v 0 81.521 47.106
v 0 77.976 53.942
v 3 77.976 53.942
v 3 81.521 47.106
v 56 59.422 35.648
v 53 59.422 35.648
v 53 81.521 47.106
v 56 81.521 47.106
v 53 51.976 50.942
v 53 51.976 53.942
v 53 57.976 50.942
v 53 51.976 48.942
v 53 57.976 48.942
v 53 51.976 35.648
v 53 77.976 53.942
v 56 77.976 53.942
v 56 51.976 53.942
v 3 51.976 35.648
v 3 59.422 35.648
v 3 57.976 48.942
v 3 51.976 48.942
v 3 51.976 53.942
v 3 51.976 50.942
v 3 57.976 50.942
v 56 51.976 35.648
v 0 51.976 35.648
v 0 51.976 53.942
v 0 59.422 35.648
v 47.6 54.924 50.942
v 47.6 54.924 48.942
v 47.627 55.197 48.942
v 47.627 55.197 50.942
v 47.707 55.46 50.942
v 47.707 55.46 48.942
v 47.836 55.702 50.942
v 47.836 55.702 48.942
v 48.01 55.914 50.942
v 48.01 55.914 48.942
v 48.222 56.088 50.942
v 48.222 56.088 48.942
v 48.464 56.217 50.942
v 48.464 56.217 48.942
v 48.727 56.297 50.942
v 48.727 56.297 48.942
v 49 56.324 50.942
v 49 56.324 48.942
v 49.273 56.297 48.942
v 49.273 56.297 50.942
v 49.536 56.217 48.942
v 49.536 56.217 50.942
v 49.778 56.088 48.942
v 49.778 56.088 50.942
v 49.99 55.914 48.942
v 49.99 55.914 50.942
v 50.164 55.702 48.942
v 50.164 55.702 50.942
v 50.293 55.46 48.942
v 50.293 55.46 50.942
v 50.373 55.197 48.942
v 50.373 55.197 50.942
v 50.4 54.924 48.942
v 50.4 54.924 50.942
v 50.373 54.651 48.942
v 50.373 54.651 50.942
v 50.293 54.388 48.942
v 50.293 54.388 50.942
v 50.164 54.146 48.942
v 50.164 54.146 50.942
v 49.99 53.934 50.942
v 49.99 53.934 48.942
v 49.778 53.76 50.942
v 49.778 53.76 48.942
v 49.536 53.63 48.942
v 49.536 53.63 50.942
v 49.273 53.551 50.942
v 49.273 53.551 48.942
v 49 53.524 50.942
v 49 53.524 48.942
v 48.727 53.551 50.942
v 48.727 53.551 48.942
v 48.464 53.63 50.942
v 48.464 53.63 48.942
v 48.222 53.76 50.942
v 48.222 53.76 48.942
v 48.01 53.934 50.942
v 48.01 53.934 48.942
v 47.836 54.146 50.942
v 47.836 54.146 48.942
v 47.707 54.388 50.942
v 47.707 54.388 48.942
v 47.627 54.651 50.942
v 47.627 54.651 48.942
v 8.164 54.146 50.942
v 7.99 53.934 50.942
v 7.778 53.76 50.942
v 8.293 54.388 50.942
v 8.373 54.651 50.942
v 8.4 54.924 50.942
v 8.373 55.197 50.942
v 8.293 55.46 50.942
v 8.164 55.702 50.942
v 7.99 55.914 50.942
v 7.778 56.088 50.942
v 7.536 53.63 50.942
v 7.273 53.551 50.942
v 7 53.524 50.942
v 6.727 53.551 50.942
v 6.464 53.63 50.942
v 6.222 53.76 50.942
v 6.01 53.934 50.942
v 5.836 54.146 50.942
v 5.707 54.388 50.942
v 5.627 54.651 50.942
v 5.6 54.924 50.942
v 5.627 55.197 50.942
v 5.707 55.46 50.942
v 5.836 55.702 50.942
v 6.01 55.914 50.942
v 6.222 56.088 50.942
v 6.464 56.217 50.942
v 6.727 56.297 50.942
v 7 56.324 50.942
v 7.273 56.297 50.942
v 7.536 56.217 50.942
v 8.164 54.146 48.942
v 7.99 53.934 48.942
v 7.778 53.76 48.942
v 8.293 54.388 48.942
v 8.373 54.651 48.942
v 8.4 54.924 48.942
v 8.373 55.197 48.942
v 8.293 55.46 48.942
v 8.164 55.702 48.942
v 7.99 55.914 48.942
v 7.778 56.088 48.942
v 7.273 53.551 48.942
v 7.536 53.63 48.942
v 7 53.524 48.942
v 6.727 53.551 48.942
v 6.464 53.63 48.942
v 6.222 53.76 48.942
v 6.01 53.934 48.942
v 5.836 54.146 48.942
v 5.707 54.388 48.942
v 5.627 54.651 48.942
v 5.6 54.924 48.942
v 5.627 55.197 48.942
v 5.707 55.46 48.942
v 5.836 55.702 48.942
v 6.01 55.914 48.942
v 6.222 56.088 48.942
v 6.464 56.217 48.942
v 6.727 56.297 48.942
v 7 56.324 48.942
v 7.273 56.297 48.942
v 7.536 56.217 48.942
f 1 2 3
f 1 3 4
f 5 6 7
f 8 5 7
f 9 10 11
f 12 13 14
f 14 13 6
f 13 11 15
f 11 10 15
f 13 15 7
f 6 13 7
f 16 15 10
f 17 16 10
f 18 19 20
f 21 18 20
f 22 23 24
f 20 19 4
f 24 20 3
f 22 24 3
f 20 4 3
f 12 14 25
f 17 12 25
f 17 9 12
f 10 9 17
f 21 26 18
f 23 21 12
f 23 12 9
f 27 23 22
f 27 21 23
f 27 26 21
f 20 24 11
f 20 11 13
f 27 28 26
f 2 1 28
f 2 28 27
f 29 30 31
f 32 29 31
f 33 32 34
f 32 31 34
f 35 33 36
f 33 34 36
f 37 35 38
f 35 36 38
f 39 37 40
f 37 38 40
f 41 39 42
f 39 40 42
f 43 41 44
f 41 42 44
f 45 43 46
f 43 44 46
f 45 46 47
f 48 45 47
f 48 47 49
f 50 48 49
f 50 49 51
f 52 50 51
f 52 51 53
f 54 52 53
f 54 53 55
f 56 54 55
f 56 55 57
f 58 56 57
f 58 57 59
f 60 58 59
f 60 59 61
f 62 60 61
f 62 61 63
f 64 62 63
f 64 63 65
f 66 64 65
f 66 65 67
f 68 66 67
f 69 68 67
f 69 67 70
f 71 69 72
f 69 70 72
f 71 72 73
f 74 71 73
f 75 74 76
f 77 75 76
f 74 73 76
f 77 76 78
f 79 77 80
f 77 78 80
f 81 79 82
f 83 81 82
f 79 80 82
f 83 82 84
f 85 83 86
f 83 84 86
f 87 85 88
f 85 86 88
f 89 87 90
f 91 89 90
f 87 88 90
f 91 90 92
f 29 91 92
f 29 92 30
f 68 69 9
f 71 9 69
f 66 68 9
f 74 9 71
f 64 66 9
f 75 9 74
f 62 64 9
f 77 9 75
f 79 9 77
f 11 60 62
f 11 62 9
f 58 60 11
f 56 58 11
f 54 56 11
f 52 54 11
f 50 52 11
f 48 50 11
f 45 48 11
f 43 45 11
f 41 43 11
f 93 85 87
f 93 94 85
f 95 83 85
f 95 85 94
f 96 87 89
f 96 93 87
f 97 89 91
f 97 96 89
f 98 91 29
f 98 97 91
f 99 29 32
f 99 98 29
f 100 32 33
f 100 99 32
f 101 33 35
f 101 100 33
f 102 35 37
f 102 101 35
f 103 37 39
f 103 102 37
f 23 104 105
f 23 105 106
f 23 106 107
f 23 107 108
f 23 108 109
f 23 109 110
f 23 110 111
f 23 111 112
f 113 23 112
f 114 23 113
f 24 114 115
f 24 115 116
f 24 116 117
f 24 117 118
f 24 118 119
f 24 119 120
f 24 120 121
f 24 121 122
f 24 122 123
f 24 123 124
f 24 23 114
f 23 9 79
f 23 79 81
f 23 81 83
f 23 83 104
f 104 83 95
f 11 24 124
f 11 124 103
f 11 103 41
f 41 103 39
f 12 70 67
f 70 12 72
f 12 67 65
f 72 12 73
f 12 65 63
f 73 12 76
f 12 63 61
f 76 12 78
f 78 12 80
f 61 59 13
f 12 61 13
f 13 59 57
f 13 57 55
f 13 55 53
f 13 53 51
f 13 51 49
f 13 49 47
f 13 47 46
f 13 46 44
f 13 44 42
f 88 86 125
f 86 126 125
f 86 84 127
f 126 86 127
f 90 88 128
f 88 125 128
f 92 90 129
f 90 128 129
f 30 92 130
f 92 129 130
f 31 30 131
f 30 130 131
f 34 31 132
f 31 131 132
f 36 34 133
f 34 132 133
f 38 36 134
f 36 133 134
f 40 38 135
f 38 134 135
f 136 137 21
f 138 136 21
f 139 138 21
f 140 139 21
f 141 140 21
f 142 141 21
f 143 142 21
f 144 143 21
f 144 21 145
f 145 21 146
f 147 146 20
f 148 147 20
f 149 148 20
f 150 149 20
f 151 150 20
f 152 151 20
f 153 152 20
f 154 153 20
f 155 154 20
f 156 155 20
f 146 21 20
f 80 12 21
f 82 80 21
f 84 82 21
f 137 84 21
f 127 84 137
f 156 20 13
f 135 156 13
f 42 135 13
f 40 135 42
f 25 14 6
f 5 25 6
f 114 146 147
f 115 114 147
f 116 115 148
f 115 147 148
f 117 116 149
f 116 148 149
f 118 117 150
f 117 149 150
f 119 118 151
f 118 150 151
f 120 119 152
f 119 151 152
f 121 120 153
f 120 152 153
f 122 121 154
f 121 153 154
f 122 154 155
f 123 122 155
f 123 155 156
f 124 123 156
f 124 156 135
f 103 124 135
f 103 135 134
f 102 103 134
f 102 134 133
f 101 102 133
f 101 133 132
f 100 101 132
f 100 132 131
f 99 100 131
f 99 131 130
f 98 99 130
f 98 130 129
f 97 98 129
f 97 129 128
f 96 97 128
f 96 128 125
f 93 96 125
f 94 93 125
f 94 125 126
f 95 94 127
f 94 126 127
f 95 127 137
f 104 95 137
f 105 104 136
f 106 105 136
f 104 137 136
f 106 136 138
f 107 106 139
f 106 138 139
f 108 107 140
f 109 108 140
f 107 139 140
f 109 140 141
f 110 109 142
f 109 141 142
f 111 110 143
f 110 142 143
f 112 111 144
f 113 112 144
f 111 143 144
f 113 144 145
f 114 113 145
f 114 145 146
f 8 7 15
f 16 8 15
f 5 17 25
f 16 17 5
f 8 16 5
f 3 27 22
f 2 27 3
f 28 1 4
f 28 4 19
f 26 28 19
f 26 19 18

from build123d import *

# Parameters (mm, degrees)
EXTRUDE_1_DEPTH     = 3
EXTRUDE_2_DEPTH     = 3
EXTRUDE_3_REACH     = 113.195
SKETCH_5_W          = 2
SKETCH_5_H          = 6
CUT_EXTRUDE_1_REACH = 101.791
SKETCH_8_R          = 1.4


with BuildPart() as part:
    # 草图2 → 凸台-拉伸1 (new body)
    with BuildSketch(Plane(origin=(0, 0, 0), x_dir=(0, 0, -1), z_dir=(1, 0, 0))):
        Polygon((-47.106132348, 81.520542784), (-35.64838785, 59.42240106), (-35.64838785, 51.976234999), (-53.941911918, 51.976234999), (-53.941911918, 77.976234999), align=None)
    extrude(amount=EXTRUDE_1_DEPTH)


with BuildPart() as body_2:
    # 草图3 → 凸台-拉伸2 (new body)
    with BuildSketch(Plane(origin=(53, 0, 0), x_dir=(0, 0, -1), z_dir=(1, 0, 0))):
        Polygon((-47.106132348, 81.520542784), (-53.941911918, 77.976234999), (-53.941911918, 51.976234999), (-35.64838785, 51.976234999), (-35.64838785, 59.42240106), align=None)
    extrude(amount=EXTRUDE_2_DEPTH)

    # 草图5 → 凸台-拉伸3 (add, up to next)
    with BuildSketch(Plane(origin=(3, 0, 0), x_dir=(0, 0, -1), z_dir=(1, 0, 0)), mode=Mode.PRIVATE) as extrude_3_sk1:
        with Locations((-49.941911918, 54.976234999)):
            Rectangle(SKETCH_5_W, SKETCH_5_H)
    extrude_3_tool1 = extrude(extrude_3_sk1.sketch, amount=EXTRUDE_3_REACH, mode=Mode.PRIVATE) - body_2.part

    add(part.part)  # 凸台-拉伸3 merges part
    add(extrude_3_tool1.solids().sort_by_distance((3, 54.976235, 49.941912))[0])

    # 草图8 → 切除-拉伸1 (cut, up to next)
    with BuildSketch(Plane(origin=(0, 0, 48.941911918), x_dir=(-1, 0, 0), z_dir=(0, 0, -1)), mode=Mode.PRIVATE) as cut_extrude_1_sk1:
        with Locations((-49, 54.923853845)):
            Circle(SKETCH_8_R)
    cut_extrude_1_tool1 = extrude(cut_extrude_1_sk1.sketch, amount=-CUT_EXTRUDE_1_REACH, mode=Mode.PRIVATE) & body_2.part
    # 草图8 → 切除-拉伸1 (cut, up to next)
    with BuildSketch(Plane(origin=(0, 0, 48.941911918), x_dir=(-1, 0, 0), z_dir=(0, 0, -1)), mode=Mode.PRIVATE) as cut_extrude_1_sk2:
        with Locations((-7, 54.923853845)):
            Circle(SKETCH_8_R)
    cut_extrude_1_tool2 = extrude(cut_extrude_1_sk2.sketch, amount=-CUT_EXTRUDE_1_REACH, mode=Mode.PRIVATE) & body_2.part
    add(cut_extrude_1_tool1.solids().sort_by_distance((49, 54.923854, 48.941912))[0], mode=Mode.SUBTRACT)
    add(cut_extrude_1_tool2.solids().sort_by_distance((7, 54.923854, 48.941912))[0], mode=Mode.SUBTRACT)


solid = body_2.part
